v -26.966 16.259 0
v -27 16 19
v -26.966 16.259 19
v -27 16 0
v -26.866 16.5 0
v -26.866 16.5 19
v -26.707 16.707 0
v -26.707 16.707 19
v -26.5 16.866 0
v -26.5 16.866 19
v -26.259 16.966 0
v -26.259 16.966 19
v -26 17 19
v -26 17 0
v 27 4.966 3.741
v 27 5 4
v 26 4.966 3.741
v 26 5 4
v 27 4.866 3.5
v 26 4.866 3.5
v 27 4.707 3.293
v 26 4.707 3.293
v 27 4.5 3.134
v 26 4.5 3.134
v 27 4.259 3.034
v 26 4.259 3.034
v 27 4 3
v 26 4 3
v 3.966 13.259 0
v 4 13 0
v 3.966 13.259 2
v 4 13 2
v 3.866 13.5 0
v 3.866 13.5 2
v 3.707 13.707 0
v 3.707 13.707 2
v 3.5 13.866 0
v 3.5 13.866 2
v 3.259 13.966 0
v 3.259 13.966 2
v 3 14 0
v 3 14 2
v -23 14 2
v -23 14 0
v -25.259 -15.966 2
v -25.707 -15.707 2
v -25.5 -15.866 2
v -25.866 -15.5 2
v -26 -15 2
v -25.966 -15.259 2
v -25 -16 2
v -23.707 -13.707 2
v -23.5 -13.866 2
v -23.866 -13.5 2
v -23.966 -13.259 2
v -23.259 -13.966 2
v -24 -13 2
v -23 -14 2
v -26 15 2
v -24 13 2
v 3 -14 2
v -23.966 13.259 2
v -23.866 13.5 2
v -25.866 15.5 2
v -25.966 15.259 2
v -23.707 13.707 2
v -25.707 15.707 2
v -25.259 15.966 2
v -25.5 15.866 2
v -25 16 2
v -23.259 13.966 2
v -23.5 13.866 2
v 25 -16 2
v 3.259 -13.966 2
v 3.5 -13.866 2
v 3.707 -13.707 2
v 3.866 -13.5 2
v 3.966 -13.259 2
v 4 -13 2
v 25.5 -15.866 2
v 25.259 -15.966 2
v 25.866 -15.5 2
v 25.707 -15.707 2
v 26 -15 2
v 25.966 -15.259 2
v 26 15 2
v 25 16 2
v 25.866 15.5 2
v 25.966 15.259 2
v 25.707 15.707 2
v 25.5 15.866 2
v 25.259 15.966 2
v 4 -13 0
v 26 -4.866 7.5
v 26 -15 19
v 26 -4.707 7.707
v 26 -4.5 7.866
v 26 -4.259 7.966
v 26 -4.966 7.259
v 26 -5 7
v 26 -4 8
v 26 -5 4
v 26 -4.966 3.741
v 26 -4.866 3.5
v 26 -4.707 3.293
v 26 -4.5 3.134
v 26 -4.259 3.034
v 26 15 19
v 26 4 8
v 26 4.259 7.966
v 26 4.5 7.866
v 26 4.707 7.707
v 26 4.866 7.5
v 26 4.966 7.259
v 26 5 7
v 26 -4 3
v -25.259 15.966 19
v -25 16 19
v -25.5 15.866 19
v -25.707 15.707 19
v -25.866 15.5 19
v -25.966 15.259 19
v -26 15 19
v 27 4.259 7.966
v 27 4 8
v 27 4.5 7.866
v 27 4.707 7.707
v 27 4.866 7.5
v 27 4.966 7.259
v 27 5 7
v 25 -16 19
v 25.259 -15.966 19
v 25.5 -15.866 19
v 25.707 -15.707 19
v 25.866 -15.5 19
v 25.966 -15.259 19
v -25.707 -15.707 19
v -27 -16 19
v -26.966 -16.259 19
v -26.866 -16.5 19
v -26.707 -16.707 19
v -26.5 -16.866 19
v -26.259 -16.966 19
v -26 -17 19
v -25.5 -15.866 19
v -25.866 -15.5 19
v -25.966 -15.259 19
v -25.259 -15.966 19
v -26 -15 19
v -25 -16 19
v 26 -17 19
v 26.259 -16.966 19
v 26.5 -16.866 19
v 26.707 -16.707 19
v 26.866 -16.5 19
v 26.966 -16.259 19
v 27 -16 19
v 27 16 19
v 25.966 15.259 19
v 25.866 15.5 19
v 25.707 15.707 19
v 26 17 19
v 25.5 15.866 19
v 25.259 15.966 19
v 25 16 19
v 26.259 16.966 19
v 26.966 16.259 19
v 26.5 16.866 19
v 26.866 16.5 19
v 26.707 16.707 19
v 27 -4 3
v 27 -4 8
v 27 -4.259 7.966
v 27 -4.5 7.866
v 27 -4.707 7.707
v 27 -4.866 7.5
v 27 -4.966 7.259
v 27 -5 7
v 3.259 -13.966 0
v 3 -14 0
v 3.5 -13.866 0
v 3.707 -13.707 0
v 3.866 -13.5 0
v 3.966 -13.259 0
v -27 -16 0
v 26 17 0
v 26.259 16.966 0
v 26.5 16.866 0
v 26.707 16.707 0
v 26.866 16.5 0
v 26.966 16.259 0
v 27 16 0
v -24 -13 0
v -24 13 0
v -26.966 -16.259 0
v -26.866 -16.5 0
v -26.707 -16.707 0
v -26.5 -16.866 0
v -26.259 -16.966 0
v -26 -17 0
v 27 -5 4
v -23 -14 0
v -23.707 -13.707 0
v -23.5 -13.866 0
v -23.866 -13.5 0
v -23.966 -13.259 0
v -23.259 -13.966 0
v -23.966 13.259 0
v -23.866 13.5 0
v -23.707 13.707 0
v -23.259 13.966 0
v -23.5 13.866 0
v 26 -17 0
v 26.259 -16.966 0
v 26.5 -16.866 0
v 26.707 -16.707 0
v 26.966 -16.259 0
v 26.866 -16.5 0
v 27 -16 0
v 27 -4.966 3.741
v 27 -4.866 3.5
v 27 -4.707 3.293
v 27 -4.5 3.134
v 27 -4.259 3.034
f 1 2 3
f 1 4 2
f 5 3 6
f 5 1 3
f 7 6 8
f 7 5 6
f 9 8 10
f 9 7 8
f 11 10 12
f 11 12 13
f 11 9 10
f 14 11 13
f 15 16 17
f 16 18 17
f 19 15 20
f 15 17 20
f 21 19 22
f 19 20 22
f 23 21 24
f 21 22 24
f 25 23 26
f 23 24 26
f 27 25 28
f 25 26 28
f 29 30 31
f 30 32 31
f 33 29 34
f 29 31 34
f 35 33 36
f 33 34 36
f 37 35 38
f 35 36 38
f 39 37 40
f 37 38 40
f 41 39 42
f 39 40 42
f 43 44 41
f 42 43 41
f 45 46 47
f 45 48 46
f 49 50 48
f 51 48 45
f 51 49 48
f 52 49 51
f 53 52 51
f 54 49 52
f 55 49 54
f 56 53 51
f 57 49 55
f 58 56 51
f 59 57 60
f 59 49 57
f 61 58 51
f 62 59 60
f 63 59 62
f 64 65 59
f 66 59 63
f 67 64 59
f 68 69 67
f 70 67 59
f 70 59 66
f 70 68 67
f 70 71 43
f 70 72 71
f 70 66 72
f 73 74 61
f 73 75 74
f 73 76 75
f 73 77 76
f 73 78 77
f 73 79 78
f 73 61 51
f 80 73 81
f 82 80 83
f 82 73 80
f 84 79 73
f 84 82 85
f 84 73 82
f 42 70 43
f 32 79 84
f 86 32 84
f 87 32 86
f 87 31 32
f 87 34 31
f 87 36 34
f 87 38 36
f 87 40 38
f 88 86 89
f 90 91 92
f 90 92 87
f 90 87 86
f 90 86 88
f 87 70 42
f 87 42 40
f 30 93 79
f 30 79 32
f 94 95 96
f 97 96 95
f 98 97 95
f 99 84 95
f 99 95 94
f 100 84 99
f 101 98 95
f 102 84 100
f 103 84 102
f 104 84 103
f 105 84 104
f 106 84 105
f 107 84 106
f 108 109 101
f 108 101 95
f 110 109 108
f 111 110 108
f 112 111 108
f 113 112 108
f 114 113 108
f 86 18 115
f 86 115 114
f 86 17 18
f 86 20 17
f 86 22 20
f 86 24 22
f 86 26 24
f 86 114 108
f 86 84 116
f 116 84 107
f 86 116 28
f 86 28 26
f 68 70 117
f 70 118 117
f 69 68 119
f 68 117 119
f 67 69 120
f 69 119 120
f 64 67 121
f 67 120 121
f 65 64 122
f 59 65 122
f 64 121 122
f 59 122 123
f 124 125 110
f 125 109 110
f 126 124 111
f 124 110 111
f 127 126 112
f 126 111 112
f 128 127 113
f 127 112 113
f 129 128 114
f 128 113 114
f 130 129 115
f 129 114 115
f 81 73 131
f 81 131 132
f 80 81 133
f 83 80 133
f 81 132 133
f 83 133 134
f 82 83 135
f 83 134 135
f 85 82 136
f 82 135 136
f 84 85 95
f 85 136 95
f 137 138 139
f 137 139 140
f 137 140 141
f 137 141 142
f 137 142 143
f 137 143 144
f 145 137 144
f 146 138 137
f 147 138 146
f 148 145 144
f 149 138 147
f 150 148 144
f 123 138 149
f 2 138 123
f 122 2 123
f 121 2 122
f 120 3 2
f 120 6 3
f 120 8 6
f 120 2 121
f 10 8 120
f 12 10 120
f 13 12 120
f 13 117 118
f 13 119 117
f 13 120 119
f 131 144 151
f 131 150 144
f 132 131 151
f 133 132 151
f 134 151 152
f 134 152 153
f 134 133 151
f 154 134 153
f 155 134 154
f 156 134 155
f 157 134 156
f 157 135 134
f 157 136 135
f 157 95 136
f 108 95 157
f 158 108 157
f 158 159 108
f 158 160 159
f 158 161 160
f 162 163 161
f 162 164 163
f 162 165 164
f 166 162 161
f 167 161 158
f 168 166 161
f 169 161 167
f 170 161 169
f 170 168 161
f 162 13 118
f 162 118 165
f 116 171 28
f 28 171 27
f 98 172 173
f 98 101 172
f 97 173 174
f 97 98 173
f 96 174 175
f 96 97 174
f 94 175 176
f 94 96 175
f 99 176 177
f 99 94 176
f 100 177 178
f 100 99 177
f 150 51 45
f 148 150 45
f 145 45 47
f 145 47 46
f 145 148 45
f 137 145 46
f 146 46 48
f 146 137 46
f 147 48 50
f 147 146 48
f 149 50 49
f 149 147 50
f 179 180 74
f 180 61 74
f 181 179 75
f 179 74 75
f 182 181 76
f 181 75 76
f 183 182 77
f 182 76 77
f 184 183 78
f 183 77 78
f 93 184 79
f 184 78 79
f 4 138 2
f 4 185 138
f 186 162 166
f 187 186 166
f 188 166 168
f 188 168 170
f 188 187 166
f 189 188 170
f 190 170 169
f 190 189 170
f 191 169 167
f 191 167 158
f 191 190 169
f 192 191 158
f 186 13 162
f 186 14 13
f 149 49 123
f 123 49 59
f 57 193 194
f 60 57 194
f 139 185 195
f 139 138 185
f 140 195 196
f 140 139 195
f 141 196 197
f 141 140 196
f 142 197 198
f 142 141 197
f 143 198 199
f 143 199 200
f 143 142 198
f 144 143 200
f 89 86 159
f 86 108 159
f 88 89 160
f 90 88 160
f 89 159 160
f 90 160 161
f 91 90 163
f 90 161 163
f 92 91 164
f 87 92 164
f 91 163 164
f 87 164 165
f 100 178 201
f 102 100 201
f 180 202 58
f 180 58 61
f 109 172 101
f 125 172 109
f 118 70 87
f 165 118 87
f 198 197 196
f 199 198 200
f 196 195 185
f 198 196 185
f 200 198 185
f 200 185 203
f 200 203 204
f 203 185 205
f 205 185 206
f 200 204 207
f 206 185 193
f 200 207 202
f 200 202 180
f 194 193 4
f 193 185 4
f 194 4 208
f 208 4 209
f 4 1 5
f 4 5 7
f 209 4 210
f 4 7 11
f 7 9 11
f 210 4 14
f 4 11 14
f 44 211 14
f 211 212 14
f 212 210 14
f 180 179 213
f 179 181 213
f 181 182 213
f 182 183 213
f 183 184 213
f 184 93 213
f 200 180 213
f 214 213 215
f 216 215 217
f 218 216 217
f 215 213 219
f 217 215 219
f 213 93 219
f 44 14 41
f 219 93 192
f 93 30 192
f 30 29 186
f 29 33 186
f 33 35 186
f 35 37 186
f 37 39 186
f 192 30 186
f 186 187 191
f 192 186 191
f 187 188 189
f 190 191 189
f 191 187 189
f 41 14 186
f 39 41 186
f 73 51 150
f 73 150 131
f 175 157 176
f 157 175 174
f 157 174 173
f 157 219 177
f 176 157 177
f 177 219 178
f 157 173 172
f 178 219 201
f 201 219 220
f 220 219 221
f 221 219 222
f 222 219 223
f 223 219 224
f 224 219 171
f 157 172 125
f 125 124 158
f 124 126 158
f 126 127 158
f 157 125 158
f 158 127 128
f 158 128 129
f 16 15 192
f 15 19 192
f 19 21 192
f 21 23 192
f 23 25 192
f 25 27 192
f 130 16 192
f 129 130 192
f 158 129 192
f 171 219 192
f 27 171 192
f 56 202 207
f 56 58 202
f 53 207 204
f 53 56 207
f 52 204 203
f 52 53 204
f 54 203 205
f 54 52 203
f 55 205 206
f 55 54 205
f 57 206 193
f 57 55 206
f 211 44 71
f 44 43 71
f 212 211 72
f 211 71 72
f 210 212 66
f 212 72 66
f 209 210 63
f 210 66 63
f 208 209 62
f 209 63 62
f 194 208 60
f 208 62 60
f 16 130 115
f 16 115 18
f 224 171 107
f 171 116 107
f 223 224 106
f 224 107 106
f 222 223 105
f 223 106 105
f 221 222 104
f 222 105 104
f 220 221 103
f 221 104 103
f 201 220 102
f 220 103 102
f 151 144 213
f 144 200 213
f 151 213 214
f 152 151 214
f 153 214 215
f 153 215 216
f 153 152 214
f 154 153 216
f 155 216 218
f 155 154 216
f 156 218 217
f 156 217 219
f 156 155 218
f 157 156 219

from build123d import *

# Parameters (mm, degrees)
SKETCH1_W           = 54
SKETCH1_H           = 34
SKETCH1_W_2         = 28
SKETCH1_H_2         = 28
BOSS_EXTRUDE1_DEPTH = 2
SKETCH2_W           = 54
SKETCH2_H           = 34
SKETCH2_W_2         = 52
SKETCH2_H_2         = 32
BOSS_EXTRUDE2_DEPTH = 17
FILLET1_R           = 1
FILLET2_R           = 1
SKETCH3_W           = 5
SKETCH3_H           = 10
CUT_EXTRUDE1_DEPTH  = 17
FILLET3_R           = 1
FILLET4_R           = 1


with BuildPart() as part:
    # Sketch1 → Boss-Extrude1 (new body)
    with BuildSketch(Plane.XY):
        Rectangle(SKETCH1_W, SKETCH1_H)
        with Locations((-10, 0)):
            Rectangle(SKETCH1_W_2, SKETCH1_H_2, mode=Mode.SUBTRACT)
    extrude(amount=BOSS_EXTRUDE1_DEPTH)

    # Sketch2 → Boss-Extrude2 (add)
    with BuildSketch(Plane.XY.offset(2)):
        Rectangle(SKETCH2_W, SKETCH2_H)
        Rectangle(SKETCH2_W_2, SKETCH2_H_2, mode=Mode.SUBTRACT)
    extrude(amount=BOSS_EXTRUDE2_DEPTH)

    # Fillet1
    fillet1_edges = [part.edges().sort_by_distance(p)[0] for p in [
        (26, 16, 10.5),
        (-26, 16, 10.5),
        (-26, -16, 10.5),
        (26, -16, 10.5),
    ]]
    fillet(fillet1_edges, radius=FILLET1_R)

    # Fillet2
    fillet2_edges = [part.edges().sort_by_distance(p)[0] for p in [
        (27, -17, 9.5),
        (-27, -17, 9.5),
        (-27, 17, 9.5),
        (27, 17, 9.5),
    ]]
    fillet(fillet2_edges, radius=FILLET2_R)

    # Sketch3 → Cut-Extrude1 (cut)
    with BuildSketch(Plane(origin=(27, 0, 0), x_dir=(0, 0, -1), z_dir=(1, 0, 0))):
        with Locations((-5.5, 0)):
            Rectangle(SKETCH3_W, SKETCH3_H)
    extrude(amount=-CUT_EXTRUDE1_DEPTH, mode=Mode.SUBTRACT)

    # Fillet3
    fillet3_edges = [part.edges().sort_by_distance(p)[0] for p in [
        (26.5, 5, 3),
        (26.5, -5, 3),
        (26.5, -5, 8),
        (26.5, 5, 8),
    ]]
    fillet(fillet3_edges, radius=FILLET3_R)

    # Fillet4
    fillet4_edges = [part.edges().sort_by_distance(p)[0] for p in [
        (4, -14, 1),
        (4, 14, 1),
        (-24, 14, 1),
        (-24, -14, 1),
    ]]
    fillet(fillet4_edges, radius=FILLET4_R)


solid = part.part
